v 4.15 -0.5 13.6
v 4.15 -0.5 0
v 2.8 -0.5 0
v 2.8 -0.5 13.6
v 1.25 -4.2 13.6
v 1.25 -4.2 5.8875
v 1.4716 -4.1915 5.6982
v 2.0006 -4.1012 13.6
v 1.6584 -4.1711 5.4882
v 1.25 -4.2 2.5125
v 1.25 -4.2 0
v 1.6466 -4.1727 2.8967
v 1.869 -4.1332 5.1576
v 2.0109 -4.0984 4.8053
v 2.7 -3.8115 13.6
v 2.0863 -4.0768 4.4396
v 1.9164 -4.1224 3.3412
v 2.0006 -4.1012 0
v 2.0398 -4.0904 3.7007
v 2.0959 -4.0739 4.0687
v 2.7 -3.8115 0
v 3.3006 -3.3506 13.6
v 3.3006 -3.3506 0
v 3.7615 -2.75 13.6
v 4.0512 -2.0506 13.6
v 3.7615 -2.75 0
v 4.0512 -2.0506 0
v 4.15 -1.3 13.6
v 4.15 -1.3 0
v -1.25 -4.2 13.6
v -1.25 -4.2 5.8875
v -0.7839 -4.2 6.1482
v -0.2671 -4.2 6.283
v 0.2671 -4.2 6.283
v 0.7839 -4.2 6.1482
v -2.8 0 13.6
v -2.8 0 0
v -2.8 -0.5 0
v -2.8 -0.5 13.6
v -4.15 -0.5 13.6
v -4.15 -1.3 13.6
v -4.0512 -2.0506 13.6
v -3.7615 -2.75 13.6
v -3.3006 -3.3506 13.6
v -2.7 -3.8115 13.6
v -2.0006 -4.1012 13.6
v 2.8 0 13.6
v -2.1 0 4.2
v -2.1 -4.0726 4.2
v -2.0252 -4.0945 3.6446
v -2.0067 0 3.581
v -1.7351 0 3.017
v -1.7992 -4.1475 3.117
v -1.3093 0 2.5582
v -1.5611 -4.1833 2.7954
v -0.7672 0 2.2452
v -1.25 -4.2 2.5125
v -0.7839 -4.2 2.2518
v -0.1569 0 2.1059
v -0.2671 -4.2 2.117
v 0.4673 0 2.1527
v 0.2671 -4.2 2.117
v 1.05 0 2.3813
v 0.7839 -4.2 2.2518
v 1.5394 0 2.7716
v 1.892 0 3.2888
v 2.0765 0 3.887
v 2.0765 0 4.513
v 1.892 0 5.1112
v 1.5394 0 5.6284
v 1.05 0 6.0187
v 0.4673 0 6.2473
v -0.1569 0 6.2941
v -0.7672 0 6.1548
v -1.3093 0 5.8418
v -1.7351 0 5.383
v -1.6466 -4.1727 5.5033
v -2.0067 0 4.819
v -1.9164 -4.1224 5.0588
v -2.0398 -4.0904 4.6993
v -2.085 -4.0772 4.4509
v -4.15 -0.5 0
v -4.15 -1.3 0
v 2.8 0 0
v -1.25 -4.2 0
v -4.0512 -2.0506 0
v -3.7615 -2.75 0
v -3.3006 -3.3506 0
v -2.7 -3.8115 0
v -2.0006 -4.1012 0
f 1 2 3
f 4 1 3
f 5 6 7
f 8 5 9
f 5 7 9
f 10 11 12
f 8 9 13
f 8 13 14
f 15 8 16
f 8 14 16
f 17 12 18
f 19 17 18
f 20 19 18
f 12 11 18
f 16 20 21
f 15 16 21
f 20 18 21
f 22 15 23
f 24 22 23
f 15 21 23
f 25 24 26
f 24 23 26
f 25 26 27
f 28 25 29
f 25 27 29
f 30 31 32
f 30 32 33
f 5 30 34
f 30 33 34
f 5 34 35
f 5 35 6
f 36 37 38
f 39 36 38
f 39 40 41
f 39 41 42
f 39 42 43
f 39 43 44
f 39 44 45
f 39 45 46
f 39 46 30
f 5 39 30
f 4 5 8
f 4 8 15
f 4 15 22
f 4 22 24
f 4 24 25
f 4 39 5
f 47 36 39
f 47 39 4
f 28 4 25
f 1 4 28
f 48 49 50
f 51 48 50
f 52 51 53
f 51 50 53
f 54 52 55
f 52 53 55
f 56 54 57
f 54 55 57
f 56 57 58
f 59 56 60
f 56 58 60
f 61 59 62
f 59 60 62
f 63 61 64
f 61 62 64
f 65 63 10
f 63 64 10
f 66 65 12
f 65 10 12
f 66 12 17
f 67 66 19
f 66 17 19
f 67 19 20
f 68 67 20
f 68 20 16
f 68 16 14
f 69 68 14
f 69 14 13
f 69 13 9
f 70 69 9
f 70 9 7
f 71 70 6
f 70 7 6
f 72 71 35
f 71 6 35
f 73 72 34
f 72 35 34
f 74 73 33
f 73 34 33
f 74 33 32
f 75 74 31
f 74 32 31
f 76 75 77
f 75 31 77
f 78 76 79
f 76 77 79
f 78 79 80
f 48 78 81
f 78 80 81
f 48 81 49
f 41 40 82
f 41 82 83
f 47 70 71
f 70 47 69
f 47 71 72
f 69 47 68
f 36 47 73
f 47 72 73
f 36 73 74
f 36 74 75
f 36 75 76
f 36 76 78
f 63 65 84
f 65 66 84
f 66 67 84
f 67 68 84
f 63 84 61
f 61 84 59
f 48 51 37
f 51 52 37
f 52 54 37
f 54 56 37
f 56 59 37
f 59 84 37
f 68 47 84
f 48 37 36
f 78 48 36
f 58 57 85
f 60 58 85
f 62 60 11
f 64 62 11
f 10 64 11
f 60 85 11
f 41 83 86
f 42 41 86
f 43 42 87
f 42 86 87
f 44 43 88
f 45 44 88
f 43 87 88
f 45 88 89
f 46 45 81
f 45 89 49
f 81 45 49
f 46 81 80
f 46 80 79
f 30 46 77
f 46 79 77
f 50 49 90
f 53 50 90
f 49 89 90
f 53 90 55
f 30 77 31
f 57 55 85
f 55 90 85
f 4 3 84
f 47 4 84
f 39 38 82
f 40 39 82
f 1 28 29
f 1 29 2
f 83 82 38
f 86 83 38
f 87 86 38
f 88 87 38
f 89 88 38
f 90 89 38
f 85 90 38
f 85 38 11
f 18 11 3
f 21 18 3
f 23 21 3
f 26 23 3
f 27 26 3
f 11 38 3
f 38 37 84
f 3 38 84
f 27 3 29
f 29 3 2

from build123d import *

# Parameters (mm, degrees)
BOSS_EXTRUDE1_DEPTH   = 13.6
M5X0_8_TAPPED_HOLE1_D = 4.2


with BuildPart() as part:
    # Sketch1 → Boss-Extrude1 (new body)
    with BuildSketch(Plane.XY):
        with BuildLine():
            Line((2.8, 0), (-2.8, 0))
            Line((-2.8, 0), (-2.8, -0.5))
            Line((-2.8, -0.5), (-4.15, -0.5))
            Line((-4.15, -0.5), (-4.15, -1.3))
            ThreePointArc((-4.15, -1.3), (-3.300609665, -3.350609665), (-1.25, -4.2))
            Line((-1.25, -4.2), (1.25, -4.2))
            ThreePointArc((1.25, -4.2), (3.300609665, -3.350609665), (4.15, -1.3))
            Line((4.15, -1.3), (4.15, -0.5))
            Line((4.15, -0.5), (2.8, -0.5))
            Line((2.8, -0.5), (2.8, 0))
        make_face()
    extrude(amount=BOSS_EXTRUDE1_DEPTH)

    # M5x0.8 Tapped Hole1 (through all)
    with Locations(Plane(origin=(0, 0, 0), x_dir=(1, 0, 0), z_dir=(0, 1, 0))):
        with Locations((0, -4.2)):
            Hole(M5X0_8_TAPPED_HOLE1_D / 2)


solid = part.part
